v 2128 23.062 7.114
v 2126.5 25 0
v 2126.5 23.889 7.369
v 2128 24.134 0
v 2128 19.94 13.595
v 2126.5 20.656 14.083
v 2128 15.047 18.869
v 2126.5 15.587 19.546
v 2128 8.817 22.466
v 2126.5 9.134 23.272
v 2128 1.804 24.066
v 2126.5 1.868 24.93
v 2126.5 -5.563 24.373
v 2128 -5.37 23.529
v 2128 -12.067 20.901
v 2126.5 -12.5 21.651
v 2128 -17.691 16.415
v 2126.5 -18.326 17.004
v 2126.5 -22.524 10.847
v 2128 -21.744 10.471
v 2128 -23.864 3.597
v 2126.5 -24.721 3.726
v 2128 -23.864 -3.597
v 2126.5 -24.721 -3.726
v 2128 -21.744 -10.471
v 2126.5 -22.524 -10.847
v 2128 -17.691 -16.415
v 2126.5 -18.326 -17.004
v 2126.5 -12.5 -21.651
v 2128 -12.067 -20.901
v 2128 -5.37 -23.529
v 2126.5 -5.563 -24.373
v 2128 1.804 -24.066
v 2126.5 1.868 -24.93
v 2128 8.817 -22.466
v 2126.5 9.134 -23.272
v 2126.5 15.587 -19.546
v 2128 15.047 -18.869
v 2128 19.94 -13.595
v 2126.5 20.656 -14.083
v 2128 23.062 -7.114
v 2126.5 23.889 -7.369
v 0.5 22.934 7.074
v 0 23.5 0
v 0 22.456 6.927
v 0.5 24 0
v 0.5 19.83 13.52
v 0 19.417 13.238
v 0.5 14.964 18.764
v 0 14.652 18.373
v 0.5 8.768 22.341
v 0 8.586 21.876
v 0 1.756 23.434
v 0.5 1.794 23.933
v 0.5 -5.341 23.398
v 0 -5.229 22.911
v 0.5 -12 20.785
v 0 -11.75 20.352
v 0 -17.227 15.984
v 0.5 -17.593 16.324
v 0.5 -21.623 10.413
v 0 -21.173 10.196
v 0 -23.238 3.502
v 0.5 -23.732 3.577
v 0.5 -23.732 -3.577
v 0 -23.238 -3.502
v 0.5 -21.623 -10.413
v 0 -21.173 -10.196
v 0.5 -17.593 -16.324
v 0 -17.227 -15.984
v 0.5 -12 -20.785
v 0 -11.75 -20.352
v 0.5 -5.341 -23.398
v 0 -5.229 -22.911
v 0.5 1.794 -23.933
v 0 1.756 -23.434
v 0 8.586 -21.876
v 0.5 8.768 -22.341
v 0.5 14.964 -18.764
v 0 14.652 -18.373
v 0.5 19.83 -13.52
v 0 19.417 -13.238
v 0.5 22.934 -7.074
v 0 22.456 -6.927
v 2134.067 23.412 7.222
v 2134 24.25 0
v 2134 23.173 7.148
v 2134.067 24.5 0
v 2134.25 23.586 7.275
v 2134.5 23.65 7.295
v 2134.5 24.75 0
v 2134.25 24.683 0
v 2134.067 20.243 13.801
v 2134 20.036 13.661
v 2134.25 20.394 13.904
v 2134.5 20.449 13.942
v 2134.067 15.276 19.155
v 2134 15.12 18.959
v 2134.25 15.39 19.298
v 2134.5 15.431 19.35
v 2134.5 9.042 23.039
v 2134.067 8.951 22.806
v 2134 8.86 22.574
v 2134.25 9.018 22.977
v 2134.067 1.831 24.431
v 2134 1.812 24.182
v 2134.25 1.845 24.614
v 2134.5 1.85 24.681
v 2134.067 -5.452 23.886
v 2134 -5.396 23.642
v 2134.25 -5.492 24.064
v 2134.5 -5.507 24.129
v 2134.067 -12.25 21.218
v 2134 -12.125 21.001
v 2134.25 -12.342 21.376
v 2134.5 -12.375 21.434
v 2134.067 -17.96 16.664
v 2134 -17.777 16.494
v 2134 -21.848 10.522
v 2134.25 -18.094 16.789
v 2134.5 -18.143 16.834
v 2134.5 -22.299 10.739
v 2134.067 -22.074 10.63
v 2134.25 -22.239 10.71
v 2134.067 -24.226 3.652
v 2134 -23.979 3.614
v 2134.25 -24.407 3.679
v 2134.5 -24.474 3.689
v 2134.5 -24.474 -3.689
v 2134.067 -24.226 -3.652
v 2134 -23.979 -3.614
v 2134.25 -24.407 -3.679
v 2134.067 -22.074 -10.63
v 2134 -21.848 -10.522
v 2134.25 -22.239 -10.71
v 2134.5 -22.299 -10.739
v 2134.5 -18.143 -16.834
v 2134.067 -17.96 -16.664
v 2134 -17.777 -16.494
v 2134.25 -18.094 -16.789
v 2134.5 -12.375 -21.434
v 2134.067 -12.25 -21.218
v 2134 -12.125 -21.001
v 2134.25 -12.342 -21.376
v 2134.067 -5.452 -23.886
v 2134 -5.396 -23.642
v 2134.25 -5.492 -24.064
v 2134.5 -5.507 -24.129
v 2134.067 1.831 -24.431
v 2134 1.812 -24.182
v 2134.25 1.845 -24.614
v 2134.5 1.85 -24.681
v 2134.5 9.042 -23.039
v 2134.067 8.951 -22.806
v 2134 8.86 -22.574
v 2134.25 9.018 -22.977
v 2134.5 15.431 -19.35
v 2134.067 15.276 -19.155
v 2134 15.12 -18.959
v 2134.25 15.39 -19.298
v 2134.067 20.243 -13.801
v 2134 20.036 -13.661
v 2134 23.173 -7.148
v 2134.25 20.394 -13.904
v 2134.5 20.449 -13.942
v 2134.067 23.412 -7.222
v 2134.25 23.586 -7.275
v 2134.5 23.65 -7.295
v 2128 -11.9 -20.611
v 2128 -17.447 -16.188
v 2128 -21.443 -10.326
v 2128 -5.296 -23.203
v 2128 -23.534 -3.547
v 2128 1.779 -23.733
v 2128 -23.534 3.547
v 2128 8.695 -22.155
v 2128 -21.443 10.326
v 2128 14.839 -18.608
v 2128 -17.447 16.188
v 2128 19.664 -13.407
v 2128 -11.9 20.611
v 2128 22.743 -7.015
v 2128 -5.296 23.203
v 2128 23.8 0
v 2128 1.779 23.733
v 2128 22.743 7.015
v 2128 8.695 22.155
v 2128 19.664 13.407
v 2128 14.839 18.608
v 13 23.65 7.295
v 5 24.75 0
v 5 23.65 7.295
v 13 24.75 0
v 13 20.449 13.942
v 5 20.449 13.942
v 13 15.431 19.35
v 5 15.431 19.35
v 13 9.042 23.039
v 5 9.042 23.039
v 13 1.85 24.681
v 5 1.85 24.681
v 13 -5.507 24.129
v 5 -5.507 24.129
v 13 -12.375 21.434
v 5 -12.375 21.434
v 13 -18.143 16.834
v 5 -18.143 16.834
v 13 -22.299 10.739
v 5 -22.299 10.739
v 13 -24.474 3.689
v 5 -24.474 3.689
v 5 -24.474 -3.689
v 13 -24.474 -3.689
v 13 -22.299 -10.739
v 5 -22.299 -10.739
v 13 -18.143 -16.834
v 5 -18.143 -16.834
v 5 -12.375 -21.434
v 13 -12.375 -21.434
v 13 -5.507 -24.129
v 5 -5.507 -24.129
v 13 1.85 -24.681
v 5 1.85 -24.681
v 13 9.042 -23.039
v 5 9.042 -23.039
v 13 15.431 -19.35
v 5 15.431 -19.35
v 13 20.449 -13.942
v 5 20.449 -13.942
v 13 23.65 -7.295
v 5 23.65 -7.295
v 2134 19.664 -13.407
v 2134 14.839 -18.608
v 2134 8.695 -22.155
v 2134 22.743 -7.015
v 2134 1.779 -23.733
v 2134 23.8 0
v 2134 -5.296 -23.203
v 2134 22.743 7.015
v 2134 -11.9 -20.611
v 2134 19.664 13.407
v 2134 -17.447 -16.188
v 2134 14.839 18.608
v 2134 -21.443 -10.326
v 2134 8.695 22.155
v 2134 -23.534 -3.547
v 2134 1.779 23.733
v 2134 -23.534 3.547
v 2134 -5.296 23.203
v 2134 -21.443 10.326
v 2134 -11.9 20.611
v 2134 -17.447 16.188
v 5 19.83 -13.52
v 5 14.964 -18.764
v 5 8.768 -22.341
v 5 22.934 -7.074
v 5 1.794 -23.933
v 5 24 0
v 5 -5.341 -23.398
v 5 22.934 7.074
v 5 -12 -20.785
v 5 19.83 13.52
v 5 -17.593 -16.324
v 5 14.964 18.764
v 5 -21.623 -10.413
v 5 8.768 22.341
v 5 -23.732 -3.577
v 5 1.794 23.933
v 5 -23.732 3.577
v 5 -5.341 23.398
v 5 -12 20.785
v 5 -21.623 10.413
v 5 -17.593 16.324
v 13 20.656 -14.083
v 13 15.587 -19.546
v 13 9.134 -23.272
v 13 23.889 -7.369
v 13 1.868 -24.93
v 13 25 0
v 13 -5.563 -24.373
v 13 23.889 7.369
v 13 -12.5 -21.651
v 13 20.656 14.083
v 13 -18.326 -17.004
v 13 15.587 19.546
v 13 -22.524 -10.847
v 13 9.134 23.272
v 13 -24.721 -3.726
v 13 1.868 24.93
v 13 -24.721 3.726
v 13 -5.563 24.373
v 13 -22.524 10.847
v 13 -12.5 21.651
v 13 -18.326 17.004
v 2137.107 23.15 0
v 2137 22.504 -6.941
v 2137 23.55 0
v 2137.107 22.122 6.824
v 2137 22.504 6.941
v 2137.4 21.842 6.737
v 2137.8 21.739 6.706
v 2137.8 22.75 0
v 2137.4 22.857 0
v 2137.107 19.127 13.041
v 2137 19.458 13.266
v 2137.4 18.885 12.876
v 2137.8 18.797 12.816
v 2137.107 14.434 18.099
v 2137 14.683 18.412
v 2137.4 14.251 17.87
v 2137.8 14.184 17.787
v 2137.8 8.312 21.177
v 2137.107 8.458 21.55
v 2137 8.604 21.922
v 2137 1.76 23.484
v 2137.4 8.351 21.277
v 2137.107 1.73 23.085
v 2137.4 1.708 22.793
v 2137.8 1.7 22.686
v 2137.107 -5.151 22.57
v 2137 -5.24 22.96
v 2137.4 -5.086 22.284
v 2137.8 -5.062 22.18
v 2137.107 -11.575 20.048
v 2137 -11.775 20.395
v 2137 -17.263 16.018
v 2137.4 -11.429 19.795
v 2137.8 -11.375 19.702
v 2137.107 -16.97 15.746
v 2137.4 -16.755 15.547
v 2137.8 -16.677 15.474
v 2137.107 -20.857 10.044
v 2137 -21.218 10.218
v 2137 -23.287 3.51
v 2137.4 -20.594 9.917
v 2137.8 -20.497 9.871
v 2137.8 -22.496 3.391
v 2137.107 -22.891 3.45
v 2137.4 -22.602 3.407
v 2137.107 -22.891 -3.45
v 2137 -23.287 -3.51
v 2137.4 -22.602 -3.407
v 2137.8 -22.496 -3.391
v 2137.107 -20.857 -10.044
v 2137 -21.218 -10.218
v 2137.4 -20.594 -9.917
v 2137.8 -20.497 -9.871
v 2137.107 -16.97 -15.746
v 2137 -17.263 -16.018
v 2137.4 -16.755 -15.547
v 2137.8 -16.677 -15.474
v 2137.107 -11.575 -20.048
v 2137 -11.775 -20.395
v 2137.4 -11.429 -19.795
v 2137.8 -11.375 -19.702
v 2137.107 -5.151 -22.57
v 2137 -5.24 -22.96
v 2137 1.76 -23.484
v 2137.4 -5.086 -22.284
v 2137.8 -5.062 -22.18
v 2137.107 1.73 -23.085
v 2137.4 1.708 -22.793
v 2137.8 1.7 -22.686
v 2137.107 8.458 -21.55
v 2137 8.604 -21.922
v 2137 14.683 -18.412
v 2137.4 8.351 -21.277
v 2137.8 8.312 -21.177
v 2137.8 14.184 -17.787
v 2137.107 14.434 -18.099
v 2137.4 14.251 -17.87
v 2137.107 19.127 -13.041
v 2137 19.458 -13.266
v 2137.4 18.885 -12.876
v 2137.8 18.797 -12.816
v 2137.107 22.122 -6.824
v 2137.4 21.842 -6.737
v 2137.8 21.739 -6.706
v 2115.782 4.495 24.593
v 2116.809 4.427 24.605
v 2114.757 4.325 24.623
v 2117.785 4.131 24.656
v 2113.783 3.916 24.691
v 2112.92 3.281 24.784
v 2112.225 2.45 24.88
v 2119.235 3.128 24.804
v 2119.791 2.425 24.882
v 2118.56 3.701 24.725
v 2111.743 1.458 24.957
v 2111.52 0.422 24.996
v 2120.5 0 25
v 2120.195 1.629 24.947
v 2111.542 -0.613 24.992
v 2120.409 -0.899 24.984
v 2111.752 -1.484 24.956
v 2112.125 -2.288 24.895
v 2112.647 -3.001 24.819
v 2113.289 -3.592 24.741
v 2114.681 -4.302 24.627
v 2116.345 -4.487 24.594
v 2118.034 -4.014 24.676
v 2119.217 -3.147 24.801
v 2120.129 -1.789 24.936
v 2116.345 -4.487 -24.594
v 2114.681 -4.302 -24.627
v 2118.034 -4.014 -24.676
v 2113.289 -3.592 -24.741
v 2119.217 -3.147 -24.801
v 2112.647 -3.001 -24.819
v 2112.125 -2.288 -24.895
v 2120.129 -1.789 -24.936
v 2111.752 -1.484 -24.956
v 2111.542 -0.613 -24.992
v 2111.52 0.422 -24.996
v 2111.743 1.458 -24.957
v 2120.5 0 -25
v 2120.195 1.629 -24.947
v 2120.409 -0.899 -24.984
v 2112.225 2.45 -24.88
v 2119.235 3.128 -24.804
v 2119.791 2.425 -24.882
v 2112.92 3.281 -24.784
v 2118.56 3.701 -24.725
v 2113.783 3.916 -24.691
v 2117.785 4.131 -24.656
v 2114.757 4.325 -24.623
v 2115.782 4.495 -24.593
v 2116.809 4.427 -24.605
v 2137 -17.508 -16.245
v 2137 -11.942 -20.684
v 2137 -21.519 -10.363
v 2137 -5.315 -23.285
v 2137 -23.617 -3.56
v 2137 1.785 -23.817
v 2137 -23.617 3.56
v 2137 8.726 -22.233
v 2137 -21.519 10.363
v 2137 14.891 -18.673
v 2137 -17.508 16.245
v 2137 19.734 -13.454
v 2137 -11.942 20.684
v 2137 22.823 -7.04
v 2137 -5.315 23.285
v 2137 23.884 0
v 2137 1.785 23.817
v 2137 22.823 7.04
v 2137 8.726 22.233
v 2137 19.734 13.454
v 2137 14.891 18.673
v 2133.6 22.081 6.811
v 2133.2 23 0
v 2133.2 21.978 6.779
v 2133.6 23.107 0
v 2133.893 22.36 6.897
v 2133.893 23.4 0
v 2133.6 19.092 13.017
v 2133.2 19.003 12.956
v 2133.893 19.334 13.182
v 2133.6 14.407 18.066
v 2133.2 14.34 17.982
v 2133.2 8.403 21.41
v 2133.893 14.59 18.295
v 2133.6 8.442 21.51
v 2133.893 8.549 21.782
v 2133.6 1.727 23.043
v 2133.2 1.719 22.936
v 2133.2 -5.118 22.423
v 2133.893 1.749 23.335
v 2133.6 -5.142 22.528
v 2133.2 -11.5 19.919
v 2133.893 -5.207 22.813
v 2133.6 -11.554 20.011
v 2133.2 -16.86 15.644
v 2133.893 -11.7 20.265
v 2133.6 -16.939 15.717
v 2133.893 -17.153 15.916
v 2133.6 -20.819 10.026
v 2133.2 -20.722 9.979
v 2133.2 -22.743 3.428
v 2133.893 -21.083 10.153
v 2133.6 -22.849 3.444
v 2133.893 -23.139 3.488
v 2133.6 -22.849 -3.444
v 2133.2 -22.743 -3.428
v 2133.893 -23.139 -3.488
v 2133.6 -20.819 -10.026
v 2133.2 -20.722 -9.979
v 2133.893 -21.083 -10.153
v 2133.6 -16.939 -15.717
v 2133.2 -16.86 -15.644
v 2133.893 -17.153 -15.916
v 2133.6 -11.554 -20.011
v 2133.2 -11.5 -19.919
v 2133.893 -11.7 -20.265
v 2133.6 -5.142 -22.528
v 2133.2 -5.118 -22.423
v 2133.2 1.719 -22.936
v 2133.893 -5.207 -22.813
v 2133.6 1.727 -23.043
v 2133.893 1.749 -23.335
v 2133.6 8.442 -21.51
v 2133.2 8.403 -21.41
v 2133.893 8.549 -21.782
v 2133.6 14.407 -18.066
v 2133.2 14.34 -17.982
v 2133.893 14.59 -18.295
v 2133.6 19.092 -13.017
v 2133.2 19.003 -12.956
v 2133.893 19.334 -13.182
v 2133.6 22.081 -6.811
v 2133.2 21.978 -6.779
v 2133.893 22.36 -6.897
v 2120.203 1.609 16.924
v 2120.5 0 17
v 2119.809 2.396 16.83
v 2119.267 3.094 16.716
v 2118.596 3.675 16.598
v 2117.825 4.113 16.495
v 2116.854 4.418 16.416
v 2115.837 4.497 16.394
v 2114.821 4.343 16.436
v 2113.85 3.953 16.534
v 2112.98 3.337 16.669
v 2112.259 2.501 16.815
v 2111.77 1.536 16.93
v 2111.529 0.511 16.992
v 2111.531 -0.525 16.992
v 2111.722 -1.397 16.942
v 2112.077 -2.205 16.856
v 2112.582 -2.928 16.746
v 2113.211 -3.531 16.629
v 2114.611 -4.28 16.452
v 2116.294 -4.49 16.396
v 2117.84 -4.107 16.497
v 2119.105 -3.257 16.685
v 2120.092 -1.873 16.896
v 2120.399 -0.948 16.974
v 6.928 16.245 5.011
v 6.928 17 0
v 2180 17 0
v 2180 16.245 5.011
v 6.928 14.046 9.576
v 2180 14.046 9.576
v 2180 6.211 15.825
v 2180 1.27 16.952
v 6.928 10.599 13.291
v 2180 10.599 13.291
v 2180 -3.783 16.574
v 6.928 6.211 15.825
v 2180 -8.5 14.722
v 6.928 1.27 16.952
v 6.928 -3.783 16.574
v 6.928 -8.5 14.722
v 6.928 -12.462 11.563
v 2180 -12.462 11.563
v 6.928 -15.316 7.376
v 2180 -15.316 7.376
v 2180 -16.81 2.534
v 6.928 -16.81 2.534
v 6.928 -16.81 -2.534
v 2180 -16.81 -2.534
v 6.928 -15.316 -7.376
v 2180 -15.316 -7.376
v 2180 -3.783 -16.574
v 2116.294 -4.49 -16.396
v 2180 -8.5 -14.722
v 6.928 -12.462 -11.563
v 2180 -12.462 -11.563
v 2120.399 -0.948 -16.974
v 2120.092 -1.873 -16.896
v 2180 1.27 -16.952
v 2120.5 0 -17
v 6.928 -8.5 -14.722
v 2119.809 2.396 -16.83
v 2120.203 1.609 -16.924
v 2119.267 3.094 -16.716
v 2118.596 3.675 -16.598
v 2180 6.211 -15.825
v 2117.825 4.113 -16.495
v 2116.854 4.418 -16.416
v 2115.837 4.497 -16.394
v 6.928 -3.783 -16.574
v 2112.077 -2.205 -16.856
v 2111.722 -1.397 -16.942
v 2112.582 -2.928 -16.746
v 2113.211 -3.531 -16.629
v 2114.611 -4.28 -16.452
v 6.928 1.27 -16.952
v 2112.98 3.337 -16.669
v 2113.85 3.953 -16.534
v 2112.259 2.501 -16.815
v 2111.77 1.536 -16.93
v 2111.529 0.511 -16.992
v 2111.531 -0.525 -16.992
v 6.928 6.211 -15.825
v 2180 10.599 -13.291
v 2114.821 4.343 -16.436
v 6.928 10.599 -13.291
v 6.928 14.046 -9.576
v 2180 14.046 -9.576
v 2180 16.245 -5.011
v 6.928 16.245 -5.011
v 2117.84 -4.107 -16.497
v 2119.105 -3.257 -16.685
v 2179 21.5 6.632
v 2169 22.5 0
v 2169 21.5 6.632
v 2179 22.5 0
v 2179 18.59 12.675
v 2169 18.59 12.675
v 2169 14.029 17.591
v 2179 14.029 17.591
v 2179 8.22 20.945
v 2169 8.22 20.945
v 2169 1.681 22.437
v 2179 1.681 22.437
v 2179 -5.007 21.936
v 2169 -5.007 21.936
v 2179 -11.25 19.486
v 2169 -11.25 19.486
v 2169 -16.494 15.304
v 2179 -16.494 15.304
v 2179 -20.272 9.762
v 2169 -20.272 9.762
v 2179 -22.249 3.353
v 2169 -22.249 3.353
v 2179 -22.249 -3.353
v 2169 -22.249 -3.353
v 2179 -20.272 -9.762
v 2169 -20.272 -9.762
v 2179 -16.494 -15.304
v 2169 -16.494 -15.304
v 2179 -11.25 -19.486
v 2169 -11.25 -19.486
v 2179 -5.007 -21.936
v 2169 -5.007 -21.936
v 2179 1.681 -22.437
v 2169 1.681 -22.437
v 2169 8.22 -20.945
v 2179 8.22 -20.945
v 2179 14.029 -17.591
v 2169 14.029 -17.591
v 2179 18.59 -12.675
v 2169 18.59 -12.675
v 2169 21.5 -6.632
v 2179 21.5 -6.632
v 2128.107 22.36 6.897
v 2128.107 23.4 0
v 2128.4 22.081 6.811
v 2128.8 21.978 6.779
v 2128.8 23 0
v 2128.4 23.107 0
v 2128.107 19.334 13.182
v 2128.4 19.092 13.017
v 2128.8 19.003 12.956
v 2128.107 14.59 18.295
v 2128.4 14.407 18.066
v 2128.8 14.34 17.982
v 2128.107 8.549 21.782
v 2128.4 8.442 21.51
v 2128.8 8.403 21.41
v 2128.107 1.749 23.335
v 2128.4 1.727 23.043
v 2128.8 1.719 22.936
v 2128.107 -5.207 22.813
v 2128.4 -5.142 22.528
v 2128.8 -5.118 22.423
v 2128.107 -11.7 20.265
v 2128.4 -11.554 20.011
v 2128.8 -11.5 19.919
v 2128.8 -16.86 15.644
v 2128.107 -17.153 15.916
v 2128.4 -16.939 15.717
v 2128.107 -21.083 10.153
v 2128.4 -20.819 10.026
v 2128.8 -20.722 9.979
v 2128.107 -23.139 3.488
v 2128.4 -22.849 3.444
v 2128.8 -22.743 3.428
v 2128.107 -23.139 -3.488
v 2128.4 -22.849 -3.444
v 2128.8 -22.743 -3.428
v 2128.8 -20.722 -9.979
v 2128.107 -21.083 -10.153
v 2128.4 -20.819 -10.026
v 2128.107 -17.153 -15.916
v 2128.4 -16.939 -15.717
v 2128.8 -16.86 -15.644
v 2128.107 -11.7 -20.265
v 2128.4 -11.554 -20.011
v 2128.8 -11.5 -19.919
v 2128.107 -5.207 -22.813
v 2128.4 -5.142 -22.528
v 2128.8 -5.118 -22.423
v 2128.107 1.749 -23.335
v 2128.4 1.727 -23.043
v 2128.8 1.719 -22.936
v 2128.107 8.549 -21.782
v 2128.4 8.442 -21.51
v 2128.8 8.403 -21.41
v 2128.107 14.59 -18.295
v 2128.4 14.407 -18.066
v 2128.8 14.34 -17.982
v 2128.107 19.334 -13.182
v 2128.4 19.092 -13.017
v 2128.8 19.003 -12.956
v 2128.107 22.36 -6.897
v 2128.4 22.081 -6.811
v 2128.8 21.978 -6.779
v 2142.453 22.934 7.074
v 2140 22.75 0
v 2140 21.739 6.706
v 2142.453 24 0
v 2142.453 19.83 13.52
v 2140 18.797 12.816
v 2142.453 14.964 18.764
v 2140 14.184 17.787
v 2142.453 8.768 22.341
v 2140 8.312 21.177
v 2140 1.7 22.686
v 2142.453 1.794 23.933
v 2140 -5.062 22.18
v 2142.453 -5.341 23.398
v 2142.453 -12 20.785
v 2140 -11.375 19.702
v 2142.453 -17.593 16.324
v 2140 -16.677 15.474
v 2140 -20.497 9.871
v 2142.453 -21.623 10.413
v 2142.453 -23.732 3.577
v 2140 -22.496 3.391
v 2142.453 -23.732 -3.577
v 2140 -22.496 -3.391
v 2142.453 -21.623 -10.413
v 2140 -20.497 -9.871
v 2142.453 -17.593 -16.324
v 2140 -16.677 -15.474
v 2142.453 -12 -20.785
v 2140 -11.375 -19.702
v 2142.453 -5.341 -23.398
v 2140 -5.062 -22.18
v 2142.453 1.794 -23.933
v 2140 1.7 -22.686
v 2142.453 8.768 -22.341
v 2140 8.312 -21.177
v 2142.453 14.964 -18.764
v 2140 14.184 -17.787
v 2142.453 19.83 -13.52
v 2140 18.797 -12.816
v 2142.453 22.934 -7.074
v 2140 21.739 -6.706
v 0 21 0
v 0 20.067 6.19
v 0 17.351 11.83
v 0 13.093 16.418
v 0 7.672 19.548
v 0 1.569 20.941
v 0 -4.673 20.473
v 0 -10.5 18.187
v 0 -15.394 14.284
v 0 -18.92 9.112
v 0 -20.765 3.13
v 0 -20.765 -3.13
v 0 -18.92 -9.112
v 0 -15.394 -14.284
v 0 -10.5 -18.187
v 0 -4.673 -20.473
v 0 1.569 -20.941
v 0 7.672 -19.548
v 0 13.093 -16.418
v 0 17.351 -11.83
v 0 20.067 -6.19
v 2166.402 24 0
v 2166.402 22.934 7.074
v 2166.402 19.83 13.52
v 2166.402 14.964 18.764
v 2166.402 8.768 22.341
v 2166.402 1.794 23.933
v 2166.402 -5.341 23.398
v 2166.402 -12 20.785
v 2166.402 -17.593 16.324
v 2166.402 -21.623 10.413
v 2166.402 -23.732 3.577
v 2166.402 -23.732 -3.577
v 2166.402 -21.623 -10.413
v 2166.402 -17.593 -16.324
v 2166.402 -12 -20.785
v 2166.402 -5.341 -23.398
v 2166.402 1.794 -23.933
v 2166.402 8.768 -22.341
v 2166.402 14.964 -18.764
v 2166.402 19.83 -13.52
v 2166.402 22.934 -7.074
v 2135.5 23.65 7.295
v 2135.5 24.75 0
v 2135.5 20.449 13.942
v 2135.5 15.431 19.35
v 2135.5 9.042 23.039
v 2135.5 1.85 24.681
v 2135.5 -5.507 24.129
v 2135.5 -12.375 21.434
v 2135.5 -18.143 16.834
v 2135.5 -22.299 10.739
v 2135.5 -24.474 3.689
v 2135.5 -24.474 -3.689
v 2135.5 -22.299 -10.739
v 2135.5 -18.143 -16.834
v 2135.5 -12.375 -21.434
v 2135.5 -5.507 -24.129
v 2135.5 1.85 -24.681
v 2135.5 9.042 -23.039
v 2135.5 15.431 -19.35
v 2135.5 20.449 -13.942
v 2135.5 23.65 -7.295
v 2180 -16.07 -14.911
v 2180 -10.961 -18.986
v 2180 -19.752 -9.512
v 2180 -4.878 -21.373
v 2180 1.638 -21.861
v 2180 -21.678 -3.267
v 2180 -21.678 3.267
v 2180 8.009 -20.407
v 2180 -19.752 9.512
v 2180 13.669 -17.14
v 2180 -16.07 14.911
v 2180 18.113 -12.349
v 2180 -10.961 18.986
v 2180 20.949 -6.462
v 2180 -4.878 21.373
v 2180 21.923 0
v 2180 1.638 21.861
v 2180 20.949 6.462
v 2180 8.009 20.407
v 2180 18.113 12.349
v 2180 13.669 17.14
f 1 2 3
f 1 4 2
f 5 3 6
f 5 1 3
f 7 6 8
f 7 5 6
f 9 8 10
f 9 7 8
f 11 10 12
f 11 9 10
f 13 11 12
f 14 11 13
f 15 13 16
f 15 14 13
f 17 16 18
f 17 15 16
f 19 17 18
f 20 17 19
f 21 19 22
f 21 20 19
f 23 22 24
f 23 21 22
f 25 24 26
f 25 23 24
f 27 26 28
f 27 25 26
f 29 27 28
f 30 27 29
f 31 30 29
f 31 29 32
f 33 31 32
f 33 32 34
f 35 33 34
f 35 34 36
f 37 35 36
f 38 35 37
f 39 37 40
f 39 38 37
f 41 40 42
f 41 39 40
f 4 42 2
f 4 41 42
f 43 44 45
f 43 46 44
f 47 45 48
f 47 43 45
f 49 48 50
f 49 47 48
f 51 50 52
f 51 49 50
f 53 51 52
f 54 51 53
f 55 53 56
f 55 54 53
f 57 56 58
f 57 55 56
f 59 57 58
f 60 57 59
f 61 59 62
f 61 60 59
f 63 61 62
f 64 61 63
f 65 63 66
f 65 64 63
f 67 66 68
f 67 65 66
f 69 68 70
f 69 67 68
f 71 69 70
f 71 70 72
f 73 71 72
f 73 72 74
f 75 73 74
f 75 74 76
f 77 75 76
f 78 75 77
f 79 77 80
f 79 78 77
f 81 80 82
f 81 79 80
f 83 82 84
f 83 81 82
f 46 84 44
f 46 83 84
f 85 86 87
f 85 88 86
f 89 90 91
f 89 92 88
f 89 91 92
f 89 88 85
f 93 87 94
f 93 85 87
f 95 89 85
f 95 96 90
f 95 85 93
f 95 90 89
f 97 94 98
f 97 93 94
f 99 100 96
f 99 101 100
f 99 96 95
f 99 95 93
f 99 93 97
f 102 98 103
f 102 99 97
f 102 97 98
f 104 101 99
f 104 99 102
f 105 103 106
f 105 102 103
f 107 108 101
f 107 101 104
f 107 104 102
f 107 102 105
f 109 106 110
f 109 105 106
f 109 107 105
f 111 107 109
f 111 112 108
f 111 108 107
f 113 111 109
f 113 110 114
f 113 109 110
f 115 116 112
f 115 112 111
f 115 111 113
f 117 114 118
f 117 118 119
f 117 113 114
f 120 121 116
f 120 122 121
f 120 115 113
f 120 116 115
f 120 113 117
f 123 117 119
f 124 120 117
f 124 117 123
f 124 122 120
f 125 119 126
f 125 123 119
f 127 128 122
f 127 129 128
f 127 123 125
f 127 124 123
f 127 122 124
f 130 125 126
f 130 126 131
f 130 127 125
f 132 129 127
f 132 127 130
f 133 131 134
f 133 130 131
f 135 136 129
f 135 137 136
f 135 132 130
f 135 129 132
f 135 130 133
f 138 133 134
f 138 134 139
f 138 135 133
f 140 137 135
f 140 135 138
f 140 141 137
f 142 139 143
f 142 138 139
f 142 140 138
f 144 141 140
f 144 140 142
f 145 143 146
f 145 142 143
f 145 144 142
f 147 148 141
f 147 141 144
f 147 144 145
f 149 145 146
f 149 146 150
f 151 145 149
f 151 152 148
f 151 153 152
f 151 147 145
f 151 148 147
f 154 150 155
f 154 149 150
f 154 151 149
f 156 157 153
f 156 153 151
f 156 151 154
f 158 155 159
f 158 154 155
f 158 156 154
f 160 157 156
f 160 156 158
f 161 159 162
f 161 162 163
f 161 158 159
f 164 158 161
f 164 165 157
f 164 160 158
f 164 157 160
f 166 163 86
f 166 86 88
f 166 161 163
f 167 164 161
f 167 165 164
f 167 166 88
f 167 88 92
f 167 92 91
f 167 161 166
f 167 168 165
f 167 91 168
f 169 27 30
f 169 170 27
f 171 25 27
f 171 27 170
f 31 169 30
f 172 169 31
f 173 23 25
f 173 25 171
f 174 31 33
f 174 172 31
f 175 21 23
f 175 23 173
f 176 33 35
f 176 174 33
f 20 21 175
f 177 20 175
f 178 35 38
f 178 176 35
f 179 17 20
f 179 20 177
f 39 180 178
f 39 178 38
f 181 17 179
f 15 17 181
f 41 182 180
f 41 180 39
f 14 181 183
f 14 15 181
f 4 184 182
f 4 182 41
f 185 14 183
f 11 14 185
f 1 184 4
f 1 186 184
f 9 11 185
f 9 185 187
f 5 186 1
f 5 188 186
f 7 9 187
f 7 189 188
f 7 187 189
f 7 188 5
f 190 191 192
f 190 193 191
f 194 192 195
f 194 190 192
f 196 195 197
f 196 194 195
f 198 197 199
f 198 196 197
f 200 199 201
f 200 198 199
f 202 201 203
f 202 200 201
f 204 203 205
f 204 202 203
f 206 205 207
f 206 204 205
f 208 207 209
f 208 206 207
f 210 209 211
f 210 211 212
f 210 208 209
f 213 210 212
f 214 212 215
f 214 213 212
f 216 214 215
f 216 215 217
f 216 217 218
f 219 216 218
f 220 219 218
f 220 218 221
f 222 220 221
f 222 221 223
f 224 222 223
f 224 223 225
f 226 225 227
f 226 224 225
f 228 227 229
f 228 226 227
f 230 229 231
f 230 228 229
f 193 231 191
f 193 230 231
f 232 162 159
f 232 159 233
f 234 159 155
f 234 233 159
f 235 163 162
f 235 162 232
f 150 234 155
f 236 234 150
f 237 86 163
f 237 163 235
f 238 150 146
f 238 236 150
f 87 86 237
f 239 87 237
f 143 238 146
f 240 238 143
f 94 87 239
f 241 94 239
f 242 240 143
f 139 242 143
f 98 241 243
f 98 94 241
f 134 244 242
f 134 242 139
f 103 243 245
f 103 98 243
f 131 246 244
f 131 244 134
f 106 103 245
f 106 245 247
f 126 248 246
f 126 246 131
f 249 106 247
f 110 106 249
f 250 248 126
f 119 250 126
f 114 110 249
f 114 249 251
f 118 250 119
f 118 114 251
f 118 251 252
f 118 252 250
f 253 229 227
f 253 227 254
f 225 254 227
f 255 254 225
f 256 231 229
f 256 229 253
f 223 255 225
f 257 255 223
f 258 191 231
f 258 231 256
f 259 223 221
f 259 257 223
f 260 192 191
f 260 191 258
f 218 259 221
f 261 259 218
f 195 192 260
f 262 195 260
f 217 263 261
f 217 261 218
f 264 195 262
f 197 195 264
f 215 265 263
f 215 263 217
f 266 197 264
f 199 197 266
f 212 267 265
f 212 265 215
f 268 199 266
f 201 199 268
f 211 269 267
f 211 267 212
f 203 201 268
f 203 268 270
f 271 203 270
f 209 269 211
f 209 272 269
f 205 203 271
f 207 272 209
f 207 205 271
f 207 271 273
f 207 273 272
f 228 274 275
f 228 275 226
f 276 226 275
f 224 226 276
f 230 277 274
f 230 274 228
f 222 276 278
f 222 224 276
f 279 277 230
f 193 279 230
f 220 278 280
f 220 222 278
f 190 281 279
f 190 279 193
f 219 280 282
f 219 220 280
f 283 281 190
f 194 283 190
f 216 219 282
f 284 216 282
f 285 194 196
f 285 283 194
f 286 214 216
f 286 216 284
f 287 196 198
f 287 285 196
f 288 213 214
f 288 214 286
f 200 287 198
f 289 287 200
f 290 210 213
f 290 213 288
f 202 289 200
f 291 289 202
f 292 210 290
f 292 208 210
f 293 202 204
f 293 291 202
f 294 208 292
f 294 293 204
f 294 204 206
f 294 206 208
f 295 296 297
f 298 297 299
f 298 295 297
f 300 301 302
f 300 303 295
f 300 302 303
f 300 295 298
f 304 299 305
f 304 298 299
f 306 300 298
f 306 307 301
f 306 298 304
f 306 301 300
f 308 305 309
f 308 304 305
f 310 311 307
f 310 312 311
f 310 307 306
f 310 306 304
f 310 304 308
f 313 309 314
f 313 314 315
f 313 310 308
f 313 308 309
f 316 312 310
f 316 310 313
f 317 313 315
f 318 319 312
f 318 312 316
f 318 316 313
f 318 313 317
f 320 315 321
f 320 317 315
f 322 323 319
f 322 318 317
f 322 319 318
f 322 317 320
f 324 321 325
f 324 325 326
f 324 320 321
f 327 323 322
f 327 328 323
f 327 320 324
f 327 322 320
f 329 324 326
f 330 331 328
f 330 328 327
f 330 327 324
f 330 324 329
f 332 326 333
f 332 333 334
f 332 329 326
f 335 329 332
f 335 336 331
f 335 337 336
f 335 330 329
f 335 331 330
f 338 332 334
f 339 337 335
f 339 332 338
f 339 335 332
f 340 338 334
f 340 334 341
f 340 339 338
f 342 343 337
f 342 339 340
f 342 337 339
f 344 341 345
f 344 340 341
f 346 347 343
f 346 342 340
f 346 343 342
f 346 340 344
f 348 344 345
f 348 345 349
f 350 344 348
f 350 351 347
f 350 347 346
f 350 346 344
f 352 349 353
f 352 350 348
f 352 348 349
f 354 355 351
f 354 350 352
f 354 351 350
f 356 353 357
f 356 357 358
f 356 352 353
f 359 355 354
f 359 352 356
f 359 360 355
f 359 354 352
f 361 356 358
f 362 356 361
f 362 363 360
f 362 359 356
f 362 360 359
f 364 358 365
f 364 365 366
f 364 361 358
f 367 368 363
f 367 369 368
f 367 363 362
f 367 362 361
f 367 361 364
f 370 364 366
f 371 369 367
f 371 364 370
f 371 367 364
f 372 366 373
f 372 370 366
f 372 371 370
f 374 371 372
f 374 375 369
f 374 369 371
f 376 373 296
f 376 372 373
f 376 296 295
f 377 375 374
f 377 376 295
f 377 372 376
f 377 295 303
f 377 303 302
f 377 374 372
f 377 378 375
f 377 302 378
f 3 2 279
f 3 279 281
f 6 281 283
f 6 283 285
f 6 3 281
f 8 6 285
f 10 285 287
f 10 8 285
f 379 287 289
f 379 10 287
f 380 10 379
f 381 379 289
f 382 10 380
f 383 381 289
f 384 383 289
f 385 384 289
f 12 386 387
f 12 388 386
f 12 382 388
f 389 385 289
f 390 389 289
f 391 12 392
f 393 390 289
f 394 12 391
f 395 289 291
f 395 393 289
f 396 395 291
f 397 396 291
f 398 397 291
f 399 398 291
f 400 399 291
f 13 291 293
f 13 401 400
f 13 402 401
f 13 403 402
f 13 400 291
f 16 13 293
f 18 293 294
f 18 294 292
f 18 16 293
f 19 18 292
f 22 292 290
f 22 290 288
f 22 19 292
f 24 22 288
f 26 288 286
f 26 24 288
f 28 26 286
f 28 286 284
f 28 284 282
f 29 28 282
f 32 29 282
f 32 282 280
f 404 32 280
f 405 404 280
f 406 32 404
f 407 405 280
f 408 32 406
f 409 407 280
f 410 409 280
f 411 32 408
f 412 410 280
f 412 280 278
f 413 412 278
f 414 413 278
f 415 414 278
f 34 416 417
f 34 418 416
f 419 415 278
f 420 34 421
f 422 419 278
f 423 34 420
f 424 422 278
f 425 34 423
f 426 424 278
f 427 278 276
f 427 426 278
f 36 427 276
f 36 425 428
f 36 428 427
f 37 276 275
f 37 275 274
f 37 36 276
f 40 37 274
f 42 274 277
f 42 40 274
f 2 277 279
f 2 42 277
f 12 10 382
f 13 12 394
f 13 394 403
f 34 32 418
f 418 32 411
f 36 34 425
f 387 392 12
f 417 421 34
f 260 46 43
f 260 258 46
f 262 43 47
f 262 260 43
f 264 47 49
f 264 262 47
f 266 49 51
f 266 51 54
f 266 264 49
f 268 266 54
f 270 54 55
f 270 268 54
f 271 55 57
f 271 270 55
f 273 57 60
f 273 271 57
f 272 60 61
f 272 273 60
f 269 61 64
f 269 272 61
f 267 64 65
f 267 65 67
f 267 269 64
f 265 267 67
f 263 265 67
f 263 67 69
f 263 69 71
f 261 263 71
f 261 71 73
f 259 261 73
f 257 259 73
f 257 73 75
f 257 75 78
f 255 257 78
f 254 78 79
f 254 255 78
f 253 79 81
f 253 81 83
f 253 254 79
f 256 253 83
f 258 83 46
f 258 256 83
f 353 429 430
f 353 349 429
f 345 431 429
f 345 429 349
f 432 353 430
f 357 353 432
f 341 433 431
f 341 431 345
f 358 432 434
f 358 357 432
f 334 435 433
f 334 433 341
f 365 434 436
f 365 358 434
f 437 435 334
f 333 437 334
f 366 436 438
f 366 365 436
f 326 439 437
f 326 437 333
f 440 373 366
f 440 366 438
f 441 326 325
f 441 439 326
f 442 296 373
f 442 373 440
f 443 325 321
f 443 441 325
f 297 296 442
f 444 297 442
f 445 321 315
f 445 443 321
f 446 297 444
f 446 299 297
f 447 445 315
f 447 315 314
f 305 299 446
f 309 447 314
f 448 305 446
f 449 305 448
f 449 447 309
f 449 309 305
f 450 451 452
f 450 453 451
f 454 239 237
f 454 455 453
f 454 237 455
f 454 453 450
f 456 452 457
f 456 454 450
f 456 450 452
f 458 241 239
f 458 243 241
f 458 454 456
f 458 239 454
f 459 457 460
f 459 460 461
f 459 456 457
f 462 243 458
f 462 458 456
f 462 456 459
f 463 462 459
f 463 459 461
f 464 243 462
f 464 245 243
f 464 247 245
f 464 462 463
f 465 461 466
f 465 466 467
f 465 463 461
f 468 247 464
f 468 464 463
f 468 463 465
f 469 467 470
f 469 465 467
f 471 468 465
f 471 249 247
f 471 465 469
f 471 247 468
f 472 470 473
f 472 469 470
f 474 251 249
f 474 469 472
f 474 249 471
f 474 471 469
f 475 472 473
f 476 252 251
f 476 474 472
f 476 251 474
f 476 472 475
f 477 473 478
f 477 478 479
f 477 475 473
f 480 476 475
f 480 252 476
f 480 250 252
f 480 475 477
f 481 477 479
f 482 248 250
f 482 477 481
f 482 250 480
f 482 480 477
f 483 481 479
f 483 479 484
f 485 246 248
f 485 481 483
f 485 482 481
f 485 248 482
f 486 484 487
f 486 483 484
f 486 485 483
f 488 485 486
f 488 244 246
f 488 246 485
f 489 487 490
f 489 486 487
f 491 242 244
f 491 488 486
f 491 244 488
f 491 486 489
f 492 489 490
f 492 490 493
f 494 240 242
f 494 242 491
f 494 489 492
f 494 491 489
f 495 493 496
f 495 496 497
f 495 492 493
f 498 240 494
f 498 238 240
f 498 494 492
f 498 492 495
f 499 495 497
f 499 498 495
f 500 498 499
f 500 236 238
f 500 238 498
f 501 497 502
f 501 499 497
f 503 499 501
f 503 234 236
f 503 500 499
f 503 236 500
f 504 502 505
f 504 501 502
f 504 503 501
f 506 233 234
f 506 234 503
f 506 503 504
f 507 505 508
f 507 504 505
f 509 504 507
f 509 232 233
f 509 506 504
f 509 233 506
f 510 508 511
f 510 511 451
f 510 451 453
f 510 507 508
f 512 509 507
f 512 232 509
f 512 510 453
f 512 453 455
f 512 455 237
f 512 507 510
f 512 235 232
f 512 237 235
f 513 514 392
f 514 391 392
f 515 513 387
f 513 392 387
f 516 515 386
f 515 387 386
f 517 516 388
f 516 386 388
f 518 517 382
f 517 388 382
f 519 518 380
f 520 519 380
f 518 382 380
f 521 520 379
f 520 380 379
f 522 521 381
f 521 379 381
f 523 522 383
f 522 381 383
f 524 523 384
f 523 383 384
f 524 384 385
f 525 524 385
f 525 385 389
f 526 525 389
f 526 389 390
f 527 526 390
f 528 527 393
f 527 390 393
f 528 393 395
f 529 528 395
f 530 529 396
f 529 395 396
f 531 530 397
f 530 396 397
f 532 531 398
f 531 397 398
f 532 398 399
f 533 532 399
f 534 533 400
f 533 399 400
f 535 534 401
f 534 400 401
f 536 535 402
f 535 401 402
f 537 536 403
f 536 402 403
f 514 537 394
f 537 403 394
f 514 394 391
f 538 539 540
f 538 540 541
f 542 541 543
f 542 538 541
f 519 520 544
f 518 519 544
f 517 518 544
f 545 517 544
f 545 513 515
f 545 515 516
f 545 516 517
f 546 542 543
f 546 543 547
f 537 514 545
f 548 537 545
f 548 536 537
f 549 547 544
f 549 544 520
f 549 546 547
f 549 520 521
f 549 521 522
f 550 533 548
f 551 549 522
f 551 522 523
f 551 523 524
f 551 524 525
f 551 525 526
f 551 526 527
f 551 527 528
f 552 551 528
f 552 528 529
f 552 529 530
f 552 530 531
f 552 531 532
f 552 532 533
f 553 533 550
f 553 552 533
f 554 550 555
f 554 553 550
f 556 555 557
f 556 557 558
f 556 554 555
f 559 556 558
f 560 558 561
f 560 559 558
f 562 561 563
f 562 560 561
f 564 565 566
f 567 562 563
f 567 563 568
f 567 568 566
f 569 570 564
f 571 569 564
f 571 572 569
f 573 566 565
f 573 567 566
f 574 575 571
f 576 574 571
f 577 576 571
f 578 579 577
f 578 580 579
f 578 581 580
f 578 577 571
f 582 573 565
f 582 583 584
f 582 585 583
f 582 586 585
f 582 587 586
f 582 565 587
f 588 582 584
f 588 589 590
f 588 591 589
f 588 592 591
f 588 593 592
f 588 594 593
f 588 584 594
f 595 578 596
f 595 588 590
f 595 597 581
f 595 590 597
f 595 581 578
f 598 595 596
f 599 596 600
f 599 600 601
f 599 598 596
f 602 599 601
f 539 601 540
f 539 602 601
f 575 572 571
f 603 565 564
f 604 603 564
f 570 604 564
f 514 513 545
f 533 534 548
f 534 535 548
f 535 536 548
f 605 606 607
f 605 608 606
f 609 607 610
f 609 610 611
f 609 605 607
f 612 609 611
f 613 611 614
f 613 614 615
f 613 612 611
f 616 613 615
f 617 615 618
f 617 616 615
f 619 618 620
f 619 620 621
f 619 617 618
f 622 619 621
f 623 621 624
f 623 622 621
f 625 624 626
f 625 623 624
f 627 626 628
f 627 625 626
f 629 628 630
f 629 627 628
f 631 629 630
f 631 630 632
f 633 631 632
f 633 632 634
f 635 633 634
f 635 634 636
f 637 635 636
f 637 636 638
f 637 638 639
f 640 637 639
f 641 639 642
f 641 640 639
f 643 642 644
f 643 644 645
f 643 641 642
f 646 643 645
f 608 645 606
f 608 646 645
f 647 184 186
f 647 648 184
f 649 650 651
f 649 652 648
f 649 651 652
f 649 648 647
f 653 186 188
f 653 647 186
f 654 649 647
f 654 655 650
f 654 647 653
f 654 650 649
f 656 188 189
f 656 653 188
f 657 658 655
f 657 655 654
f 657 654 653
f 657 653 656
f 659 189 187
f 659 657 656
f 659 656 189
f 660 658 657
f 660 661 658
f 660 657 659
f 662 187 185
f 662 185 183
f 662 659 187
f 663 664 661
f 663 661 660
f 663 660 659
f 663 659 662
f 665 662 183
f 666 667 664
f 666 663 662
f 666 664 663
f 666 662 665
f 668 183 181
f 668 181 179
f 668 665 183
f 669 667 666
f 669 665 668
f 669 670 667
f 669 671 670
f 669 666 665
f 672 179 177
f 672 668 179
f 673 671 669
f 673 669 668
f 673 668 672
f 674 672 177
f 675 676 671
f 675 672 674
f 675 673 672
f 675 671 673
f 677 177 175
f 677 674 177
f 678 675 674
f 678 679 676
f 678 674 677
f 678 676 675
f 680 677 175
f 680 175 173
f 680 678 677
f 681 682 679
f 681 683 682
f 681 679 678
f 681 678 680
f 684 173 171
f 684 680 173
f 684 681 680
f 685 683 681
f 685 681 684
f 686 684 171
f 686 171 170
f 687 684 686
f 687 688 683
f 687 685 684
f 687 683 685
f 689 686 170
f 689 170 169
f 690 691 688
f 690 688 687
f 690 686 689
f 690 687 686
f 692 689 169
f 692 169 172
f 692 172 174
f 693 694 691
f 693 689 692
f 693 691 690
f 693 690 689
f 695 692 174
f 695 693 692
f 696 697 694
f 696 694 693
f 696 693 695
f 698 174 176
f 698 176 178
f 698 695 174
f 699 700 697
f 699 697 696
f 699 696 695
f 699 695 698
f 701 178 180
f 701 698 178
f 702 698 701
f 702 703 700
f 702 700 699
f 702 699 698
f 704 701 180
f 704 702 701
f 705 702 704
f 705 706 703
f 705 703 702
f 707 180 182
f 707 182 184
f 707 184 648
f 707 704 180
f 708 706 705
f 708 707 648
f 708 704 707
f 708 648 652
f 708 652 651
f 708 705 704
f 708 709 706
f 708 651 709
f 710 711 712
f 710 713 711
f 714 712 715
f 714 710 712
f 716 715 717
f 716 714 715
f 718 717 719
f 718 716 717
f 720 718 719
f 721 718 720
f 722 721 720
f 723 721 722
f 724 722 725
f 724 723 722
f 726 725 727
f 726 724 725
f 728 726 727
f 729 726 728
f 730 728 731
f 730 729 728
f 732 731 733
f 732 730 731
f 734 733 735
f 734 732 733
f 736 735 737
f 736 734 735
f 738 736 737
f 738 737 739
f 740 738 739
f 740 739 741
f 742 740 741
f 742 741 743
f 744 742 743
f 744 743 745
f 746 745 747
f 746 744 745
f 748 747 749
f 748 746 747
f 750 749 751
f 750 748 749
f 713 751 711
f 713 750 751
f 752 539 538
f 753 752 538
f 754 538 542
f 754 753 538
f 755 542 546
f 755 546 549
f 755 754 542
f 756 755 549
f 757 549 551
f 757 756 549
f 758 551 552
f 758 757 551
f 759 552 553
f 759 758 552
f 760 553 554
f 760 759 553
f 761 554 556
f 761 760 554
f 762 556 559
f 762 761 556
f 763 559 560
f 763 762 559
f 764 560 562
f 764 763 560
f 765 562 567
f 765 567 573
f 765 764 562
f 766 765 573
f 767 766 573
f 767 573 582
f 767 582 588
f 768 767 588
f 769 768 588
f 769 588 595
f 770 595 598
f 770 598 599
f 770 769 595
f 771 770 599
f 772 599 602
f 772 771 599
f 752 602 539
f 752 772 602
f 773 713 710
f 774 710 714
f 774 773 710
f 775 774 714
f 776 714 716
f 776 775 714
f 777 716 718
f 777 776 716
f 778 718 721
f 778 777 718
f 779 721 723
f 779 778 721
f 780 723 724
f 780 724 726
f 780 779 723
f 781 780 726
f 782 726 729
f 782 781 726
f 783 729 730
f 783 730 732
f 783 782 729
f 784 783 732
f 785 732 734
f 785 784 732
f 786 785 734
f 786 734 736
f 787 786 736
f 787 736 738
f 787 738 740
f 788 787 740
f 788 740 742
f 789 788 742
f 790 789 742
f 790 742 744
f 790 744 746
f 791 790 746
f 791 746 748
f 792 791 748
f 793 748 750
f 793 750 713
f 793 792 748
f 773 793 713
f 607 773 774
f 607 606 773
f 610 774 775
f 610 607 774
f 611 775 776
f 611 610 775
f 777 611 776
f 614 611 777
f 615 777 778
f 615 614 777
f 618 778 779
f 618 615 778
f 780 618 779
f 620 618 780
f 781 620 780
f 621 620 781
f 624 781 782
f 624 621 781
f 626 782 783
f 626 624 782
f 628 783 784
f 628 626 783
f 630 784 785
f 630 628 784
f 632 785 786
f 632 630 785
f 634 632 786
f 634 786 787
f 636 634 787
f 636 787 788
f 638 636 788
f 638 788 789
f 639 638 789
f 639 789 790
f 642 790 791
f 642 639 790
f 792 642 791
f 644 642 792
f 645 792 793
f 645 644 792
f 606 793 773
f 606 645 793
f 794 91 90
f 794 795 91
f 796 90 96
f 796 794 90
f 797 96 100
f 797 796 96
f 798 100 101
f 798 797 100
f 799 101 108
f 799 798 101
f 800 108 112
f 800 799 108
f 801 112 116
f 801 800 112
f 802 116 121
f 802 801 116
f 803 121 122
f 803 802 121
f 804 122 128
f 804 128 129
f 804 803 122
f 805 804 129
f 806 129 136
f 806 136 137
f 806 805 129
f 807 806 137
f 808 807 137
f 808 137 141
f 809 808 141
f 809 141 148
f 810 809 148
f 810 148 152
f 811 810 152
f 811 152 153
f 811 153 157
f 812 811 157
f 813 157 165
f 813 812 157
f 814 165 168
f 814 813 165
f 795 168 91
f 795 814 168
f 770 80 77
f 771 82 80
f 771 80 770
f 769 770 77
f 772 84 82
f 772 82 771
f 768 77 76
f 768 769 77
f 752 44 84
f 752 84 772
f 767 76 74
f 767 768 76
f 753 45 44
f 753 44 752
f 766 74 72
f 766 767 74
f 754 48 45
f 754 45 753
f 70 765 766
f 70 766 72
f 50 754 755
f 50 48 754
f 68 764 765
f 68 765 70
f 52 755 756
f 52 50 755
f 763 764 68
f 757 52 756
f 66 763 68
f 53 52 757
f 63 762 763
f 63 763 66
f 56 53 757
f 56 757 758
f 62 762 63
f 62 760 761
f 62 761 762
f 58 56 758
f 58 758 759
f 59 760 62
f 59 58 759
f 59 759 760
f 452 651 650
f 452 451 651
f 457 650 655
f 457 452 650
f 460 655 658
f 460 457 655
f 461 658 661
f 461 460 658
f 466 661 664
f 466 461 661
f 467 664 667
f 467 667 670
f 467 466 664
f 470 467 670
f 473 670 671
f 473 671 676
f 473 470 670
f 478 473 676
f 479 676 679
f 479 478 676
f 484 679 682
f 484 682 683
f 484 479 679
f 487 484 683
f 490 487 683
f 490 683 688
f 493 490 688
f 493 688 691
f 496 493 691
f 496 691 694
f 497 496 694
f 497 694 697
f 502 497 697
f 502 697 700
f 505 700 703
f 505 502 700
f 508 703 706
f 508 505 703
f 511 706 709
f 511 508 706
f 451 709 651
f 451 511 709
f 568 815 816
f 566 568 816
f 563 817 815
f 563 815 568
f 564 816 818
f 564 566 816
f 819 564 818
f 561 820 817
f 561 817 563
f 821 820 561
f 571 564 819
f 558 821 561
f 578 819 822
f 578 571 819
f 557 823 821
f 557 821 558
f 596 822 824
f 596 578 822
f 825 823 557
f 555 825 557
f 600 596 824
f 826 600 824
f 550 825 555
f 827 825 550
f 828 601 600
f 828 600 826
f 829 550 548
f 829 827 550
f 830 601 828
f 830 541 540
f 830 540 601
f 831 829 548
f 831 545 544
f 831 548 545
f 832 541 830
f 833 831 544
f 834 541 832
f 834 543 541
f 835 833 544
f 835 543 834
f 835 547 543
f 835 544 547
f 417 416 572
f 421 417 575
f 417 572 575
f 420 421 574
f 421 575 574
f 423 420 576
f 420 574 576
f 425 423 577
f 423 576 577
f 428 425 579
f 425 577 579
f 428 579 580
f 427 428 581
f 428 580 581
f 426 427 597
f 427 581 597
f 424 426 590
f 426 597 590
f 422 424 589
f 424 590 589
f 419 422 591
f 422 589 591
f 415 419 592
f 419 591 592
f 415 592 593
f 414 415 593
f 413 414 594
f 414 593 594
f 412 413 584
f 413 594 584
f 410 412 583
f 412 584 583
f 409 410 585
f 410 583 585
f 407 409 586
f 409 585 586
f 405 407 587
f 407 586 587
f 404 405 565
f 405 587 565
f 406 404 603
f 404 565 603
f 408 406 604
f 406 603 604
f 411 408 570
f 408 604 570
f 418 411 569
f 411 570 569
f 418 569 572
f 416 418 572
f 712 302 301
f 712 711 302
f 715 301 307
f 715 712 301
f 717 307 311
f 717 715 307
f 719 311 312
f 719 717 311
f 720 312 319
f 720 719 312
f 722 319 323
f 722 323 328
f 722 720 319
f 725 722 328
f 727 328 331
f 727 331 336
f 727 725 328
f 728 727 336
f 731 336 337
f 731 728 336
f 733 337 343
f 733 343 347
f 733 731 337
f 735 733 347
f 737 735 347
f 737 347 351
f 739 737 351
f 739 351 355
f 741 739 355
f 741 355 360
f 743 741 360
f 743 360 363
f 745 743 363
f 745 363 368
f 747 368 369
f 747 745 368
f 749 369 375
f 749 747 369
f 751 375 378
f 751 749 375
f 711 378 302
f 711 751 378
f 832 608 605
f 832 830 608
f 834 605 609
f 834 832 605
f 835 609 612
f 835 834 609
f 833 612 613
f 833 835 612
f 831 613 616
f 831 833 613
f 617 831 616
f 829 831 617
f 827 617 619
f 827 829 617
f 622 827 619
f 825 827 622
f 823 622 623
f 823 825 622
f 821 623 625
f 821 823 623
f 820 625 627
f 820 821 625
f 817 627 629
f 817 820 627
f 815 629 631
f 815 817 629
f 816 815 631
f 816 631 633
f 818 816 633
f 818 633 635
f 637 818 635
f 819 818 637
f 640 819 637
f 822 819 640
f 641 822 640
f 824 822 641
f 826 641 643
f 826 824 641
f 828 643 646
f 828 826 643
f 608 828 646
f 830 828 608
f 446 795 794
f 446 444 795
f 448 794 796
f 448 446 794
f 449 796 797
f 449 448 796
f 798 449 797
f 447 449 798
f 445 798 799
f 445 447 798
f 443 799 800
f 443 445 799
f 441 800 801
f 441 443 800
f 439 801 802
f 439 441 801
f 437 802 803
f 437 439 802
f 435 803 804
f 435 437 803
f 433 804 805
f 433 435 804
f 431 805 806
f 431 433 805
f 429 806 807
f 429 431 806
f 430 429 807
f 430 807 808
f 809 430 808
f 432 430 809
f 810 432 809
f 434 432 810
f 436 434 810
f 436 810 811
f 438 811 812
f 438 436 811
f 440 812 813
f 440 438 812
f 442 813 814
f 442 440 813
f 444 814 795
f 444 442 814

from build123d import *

# Parameters (mm, degrees)
SKETCH2_R          = 4.5
CUT_EXTRUDE1_DEPTH = 50


with BuildPart() as part:
    # Sketch1 → Base-Revolve (revolve)
    with BuildSketch(Plane.XY):
        with BuildLine():
            Line((0, 21), (0, 23.5))
            Line((0, 23.5), (0.5, 24))
            Line((0.5, 24), (5, 24))
            Line((5, 24), (5, 24.75))
            Line((5, 24.75), (13, 24.75))
            Line((13, 24.75), (13, 25))
            Line((13, 25), (2126.5, 25))
            Line((2126.5, 25), (2128, 24.133974596))
            Line((2128, 24.133974596), (2128, 23.8))
            ThreePointArc((2128, 23.8), (2128.234314575, 23.234314575), (2128.8, 23))
            Line((2128.8, 23), (2133.2, 23))
            ThreePointArc((2133.2, 23), (2133.765685425, 23.234314575), (2134, 23.8))
            Line((2134, 23.8), (2134, 24.25))
            ThreePointArc((2134, 24.25), (2134.146446609, 24.603553391), (2134.5, 24.75))
            Line((2134.5, 24.75), (2135.5, 24.75))
            Line((2135.5, 24.75), (2137, 23.883974596))
            Line((2137, 23.883974596), (2137, 23.55))
            ThreePointArc((2137, 23.55), (2137.234314575, 22.984314575), (2137.8, 22.75))
            Line((2137.8, 22.75), (2140, 22.75))
            Line((2140, 22.75), (2142.453263132, 24))
            Line((2142.453263132, 24), (2166.401923789, 24))
            Line((2166.401923789, 24), (2169, 22.5))
            Line((2169, 22.5), (2179, 22.5))
            Line((2179, 22.5), (2180, 21.922649731))
            Line((2180, 21.922649731), (2180, 17))
            Line((2180, 17), (6.92820323, 17))
            Line((6.92820323, 17), (0, 21))
        make_face()
    revolve(axis=Axis((0, 0, 0), (1, 0, 0)))

    # Sketch2 → Cut-Extrude1 (cut, symmetric)
    with BuildSketch(Plane.XY):
        with Locations((2116, 0)):
            Circle(SKETCH2_R)
    extrude(amount=CUT_EXTRUDE1_DEPTH, both=True, mode=Mode.SUBTRACT)


solid = part.part
